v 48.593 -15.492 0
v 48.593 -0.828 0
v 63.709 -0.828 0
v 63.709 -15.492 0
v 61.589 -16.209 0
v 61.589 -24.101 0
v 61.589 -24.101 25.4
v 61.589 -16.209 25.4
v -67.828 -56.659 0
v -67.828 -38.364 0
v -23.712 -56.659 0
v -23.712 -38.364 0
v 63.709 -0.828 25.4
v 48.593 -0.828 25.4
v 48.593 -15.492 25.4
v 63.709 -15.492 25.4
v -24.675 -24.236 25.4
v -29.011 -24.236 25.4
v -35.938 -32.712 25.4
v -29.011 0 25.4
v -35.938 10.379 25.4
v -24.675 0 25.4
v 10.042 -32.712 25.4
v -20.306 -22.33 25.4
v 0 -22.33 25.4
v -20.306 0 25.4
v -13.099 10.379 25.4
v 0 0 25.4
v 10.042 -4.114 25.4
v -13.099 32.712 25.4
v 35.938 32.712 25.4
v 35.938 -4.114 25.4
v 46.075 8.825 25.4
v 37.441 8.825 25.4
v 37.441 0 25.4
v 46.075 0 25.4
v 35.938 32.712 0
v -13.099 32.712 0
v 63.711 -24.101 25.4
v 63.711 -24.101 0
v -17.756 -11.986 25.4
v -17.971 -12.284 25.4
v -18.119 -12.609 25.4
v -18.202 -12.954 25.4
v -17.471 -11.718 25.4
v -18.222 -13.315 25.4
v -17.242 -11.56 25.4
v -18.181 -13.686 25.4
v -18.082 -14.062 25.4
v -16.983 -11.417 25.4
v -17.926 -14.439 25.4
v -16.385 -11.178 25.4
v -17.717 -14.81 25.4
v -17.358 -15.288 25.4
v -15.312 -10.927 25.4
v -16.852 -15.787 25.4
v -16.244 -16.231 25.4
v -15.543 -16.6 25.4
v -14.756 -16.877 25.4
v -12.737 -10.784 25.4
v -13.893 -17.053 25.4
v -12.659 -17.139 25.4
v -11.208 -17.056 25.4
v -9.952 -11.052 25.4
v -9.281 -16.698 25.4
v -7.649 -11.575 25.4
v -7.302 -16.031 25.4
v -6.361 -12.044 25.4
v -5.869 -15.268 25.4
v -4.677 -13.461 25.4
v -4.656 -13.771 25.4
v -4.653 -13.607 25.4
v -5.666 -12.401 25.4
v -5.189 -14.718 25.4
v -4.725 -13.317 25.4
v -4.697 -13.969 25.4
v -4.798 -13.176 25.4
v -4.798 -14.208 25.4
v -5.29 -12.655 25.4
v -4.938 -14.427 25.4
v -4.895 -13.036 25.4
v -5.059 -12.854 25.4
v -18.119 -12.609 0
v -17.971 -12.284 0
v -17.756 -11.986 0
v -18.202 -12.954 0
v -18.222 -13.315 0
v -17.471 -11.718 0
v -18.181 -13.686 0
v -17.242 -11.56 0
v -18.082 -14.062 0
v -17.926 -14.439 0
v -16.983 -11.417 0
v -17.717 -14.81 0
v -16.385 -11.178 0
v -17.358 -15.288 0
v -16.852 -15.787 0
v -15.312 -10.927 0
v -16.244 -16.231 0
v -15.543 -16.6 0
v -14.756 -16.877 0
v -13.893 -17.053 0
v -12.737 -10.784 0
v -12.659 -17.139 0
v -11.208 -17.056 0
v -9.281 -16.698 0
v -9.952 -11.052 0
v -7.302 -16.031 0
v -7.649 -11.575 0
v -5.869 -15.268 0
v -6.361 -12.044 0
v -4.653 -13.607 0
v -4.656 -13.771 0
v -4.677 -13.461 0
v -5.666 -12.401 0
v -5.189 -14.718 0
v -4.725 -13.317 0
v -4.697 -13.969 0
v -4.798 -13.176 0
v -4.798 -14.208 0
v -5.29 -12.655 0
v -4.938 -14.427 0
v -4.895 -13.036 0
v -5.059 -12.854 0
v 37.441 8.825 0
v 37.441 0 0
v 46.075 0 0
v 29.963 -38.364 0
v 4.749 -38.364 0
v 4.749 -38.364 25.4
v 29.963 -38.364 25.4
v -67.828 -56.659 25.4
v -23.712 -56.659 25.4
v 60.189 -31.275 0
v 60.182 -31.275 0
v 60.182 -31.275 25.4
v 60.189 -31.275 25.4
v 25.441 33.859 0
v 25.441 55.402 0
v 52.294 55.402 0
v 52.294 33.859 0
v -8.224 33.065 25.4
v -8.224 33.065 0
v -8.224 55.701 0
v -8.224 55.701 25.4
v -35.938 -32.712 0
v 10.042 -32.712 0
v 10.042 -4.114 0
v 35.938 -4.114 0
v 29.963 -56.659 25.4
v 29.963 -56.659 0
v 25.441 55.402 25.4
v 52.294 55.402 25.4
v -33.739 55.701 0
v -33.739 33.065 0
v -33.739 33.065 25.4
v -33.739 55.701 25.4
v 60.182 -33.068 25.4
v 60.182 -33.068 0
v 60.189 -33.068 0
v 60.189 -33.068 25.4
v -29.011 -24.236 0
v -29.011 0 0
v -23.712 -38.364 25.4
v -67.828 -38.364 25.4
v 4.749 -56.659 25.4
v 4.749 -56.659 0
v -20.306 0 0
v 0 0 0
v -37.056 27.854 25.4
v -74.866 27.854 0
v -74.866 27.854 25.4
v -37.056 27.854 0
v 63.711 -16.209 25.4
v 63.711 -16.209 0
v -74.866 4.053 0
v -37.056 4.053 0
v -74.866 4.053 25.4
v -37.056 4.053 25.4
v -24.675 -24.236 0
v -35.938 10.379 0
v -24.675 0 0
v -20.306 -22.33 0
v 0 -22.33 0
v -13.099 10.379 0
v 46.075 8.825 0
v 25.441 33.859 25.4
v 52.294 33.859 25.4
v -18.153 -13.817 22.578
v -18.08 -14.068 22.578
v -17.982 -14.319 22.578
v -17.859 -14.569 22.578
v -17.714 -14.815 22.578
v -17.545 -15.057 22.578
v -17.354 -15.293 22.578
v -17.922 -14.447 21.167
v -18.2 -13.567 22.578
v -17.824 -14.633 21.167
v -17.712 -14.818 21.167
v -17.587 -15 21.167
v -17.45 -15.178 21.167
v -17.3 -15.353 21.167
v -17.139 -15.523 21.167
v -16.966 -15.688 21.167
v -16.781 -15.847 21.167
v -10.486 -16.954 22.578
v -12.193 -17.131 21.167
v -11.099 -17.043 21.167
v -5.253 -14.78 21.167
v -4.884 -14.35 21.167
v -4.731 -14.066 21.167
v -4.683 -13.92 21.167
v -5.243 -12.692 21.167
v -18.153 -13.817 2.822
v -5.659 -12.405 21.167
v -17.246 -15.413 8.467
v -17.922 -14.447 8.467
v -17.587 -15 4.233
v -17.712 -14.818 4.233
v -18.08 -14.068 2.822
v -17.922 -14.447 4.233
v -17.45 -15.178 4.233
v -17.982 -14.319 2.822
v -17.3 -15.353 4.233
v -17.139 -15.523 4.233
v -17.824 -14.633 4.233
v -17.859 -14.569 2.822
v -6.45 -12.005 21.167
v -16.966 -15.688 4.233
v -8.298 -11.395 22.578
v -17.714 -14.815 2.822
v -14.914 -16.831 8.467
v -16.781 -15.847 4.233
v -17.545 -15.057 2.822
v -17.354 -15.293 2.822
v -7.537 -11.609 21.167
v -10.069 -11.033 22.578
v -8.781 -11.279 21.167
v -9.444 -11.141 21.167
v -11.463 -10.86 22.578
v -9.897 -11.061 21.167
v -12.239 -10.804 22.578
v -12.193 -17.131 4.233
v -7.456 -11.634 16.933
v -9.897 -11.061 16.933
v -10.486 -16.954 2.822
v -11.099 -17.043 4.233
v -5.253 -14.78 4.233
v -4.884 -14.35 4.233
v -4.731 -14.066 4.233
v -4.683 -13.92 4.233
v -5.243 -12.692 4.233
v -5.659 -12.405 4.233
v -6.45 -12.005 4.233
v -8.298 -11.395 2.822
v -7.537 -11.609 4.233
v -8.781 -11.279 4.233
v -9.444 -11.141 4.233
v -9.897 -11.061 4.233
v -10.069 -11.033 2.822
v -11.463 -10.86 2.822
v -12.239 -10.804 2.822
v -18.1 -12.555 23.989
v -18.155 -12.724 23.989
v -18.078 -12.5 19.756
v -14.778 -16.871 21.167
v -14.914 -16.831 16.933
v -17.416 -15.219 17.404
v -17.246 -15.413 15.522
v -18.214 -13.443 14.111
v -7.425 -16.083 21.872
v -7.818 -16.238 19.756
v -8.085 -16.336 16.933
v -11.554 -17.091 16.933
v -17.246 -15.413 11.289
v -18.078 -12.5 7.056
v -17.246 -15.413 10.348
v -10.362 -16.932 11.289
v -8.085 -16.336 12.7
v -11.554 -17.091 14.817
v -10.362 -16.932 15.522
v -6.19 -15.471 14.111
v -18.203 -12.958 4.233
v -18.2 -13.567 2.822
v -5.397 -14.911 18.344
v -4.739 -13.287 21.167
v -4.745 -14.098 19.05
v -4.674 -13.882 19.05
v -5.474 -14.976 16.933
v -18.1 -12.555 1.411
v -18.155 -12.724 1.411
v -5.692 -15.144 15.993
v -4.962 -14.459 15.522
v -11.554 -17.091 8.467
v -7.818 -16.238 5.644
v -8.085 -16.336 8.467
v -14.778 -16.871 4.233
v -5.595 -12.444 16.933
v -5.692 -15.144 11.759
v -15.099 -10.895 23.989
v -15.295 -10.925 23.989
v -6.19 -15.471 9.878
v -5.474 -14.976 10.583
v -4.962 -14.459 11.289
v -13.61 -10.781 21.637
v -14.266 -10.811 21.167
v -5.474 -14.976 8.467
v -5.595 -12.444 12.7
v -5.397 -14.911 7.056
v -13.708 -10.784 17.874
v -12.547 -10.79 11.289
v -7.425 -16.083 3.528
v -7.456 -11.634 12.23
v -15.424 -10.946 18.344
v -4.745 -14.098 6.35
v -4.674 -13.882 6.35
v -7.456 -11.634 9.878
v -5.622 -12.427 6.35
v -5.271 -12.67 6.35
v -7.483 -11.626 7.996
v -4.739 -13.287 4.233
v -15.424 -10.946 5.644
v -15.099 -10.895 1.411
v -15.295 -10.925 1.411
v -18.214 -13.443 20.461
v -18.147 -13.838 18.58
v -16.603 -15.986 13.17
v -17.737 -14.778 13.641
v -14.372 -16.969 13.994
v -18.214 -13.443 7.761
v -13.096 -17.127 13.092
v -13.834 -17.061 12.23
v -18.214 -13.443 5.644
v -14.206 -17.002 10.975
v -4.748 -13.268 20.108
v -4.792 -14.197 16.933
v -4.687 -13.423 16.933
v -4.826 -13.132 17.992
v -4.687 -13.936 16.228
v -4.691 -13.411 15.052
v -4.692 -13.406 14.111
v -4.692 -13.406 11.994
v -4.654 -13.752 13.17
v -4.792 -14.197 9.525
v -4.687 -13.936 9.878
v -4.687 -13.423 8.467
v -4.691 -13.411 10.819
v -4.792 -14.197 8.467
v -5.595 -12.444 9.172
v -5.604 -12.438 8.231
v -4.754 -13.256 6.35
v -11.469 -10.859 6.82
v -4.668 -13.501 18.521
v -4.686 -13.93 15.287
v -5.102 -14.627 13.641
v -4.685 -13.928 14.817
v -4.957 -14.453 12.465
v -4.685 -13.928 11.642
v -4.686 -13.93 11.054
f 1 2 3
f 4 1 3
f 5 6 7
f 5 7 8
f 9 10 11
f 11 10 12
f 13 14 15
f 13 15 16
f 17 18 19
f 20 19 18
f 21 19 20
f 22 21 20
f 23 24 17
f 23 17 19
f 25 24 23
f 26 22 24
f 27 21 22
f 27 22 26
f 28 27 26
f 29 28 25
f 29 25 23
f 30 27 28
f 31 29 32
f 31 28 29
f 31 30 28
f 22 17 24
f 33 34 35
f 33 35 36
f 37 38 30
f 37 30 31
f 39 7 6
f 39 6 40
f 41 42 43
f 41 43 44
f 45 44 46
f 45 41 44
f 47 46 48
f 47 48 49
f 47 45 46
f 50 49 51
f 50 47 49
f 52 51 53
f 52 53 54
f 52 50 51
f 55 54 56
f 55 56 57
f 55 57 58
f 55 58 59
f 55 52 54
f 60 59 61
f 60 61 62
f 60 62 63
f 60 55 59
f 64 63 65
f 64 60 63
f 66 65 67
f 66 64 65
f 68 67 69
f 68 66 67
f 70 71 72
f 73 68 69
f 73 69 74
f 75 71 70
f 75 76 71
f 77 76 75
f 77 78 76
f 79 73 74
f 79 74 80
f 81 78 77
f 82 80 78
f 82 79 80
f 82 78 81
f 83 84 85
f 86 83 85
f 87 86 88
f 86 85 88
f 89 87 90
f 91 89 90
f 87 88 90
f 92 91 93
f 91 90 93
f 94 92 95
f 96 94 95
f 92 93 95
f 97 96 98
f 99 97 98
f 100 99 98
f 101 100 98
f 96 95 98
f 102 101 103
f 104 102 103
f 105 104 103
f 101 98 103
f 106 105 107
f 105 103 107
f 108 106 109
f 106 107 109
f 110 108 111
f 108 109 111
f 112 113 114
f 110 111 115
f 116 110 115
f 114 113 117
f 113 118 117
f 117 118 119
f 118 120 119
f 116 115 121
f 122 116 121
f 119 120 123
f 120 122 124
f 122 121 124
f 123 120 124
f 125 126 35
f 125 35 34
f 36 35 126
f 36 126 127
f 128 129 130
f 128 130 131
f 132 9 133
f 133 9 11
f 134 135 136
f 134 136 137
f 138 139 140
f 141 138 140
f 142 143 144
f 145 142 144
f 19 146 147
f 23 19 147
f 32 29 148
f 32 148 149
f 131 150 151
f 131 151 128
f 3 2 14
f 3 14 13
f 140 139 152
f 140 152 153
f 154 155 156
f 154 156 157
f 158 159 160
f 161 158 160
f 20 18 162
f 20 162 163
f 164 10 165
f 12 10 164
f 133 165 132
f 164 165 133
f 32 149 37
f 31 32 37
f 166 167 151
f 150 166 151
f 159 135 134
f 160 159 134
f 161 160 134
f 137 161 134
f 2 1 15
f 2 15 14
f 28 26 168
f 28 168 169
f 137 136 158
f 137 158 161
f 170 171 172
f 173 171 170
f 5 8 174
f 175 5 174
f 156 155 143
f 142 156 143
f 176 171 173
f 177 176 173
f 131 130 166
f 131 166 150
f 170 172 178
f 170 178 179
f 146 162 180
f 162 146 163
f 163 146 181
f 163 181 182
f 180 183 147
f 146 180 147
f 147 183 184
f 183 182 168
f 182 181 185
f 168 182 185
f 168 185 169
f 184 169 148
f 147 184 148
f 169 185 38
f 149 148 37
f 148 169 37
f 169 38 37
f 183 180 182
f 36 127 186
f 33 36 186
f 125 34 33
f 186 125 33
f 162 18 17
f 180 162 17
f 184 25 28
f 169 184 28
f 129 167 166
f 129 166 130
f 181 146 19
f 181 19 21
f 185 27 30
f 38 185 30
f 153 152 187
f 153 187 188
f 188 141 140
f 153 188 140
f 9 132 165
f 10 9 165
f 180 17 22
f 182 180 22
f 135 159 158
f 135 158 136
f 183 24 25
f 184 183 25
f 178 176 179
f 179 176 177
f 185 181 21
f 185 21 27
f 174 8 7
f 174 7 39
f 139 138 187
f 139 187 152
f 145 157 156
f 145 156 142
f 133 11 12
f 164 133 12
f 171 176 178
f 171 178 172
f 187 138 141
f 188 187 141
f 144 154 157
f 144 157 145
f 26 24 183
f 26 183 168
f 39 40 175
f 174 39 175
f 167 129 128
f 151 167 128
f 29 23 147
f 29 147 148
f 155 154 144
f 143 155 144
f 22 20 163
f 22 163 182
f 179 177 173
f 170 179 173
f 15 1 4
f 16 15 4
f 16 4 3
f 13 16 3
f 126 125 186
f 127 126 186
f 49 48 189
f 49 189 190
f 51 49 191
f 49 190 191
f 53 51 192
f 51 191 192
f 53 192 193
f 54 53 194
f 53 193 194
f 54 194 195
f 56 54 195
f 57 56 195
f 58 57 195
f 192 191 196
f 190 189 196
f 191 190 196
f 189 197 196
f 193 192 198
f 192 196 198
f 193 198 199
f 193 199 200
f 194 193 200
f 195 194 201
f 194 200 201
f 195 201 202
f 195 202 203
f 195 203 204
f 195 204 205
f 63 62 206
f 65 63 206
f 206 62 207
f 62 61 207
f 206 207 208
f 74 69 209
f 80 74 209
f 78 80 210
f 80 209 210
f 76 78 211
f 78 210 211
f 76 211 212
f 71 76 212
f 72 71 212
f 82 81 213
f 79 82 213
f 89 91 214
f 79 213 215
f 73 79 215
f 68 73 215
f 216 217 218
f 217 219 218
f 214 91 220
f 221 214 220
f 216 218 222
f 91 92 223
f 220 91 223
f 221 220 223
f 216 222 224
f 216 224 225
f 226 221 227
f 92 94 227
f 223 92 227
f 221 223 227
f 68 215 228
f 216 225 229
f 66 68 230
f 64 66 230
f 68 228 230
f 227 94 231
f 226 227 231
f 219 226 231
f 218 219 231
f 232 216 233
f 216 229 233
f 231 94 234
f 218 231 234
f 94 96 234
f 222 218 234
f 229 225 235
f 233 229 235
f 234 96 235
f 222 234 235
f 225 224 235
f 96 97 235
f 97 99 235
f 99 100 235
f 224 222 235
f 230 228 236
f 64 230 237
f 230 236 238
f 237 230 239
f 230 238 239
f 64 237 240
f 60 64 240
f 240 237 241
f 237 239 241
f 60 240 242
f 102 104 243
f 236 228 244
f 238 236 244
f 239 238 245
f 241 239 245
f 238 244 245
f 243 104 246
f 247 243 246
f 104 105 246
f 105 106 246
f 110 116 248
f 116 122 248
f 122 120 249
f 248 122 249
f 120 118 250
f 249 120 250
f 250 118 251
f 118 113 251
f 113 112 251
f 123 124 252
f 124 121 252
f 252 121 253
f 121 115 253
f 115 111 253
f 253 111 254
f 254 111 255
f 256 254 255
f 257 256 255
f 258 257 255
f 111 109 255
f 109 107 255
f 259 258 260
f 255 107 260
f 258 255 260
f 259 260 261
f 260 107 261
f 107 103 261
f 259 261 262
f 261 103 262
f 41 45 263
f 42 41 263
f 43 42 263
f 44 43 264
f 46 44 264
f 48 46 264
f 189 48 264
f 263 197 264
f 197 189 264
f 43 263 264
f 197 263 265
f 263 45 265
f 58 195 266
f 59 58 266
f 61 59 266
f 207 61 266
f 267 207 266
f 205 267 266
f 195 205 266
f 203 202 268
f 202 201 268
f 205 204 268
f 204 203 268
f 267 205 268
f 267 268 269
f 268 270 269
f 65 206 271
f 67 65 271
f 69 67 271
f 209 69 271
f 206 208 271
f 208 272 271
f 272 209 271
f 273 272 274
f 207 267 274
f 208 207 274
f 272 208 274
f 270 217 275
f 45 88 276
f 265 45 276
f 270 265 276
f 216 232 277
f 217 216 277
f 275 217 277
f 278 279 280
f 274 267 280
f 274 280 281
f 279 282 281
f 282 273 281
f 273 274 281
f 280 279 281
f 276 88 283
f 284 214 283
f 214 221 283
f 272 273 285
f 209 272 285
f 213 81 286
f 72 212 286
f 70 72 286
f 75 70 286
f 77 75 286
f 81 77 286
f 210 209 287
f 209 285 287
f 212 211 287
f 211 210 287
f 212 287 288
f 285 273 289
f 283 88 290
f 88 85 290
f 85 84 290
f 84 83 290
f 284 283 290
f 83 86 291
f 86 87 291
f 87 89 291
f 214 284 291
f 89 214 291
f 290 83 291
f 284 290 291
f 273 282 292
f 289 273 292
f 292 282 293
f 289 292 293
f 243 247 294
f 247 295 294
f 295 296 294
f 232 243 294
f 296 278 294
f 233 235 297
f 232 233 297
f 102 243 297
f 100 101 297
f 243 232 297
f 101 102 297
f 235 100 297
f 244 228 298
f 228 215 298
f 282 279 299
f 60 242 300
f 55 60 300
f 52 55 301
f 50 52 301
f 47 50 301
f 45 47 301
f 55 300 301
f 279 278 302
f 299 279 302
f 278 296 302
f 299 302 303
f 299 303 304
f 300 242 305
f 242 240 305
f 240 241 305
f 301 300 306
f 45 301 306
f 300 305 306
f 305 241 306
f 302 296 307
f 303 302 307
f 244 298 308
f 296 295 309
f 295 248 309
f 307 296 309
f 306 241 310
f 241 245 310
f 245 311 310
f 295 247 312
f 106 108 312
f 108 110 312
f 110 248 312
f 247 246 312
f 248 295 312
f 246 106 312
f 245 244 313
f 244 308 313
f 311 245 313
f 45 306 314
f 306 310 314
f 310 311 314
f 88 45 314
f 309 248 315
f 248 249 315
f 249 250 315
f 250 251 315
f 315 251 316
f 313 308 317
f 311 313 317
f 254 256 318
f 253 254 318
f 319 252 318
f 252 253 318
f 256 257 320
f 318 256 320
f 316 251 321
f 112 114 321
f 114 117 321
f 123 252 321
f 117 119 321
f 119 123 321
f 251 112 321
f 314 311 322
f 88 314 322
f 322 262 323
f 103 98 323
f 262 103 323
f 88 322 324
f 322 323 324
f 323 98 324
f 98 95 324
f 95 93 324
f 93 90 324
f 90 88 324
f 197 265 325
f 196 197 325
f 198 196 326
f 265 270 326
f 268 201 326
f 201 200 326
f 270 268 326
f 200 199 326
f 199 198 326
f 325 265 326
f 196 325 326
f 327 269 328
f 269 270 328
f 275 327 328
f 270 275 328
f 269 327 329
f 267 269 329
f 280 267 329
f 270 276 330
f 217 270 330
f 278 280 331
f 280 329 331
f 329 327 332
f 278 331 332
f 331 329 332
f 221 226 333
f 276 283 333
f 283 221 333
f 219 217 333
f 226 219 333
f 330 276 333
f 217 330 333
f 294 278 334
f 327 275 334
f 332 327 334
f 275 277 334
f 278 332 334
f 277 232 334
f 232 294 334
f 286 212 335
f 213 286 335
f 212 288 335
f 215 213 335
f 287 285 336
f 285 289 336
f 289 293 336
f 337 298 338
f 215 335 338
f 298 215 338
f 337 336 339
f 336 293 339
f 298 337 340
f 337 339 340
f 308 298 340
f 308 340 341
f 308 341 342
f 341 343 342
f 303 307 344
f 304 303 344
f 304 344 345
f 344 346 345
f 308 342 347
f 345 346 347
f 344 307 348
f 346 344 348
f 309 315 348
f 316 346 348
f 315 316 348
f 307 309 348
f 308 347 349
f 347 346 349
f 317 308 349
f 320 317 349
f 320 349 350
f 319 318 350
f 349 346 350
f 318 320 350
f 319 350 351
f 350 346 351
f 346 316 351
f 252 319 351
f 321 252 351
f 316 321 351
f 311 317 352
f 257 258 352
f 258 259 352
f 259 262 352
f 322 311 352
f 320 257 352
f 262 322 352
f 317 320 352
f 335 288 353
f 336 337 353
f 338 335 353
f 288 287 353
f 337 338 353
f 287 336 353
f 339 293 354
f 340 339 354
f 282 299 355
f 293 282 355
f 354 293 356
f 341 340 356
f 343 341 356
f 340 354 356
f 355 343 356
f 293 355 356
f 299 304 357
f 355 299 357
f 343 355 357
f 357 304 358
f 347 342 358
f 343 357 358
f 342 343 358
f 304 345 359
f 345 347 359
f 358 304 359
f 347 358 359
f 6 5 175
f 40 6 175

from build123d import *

# Parameters (mm, degrees)
F0_W      = 71.8751400709
F0_H      = 65.4248073697
F1_DEPTH  = 25.4
F2_W      = 22.8386623785
F2_H      = 22.3337542266
F3_DEPTH  = 25.401
F4_W      = 25.8953208104
F4_H      = 28.5988273099
F5_DEPTH  = 25.401
F6_W      = 20.3064456582
F6_H      = 22.3295912147
F7_DEPTH  = 25.401
F8_W      = 4.3360479176
F8_H      = 24.2358855903
F9_DEPTH  = 25.401
F10_W     = 97.7910701185
F10_H     = 18.2947292924
F11_DEPTH = 25.4
F12_W     = 28.4608709626
F12_H     = 29.4496640563
F13_DEPTH = 25.401
F14_W     = 25.5147358403
F14_H     = 22.6351767778
F15_DEPTH = 25.4
F16_W     = 26.8525015563
F16_H     = 21.5431787074
F17_DEPTH = 25.4
F18_W     = 8.6342580616
F18_H     = 8.8252546266
F19_DEPTH = 25.4
F18_W_2   = 15.1156596839
F18_H_2   = 14.6633193363
F18_W_3   = 2.1220184863
F18_H_3   = 7.8927390277
F18_W_4   = 0.0067055225
F18_H_4   = 1.7926245928
F20_W     = 37.8104783595
F20_H     = 23.8008620217
F21_DEPTH = 25.4
F23_DEPTH = 25.4


with BuildPart() as f1:
    # F0 (on Top) → F1 (new body)
    with BuildSketch(Plane.XY):
        Rectangle(F0_W, F0_H)
    extrude(amount=F1_DEPTH)

    # F2 (on face) → F3 (cut, through all)
    with BuildSketch(Plane.XY.offset(25.4)):
        with Locations((-24.5182388462, 21.5455265716)):
            Rectangle(F2_W, F2_H)
    extrude(amount=-F3_DEPTH, mode=Mode.SUBTRACT)

    # F4 (on face) → F5 (cut, through all)
    with BuildSketch(Plane.XY.offset(25.4)):
        with Locations((22.9899096303, -18.4129900299)):
            Rectangle(F4_W, F4_H)
    extrude(amount=-F5_DEPTH, mode=Mode.SUBTRACT)

    # F6 (on face) → F7 (cut, through all)
    with BuildSketch(Plane.XY.offset(25.4)):
        with Locations((-10.1532228291, -11.1647956073)):
            Rectangle(F6_W, F6_H)
    extrude(amount=-F7_DEPTH, mode=Mode.SUBTRACT)

    # F8 (on face) → F9 (cut, through all)
    with BuildSketch(Plane.XY.offset(25.4)):
        with Locations((-26.8425736576, -12.1179427952)):
            Rectangle(F8_W, F8_H)
    extrude(amount=-F9_DEPTH, mode=Mode.SUBTRACT)


with BuildPart() as f11:
    # F10 (on Top) → F11 (new body)
    with BuildSketch(Plane.XY):
        with Locations((-18.9329413697, -47.5115664303)):
            Rectangle(F10_W, F10_H)
    extrude(amount=F11_DEPTH)

    # F12 (on face) → F13 (cut, through all)
    with BuildSketch(Plane.XY.offset(25.4)):
        with Locations((-9.4812272582, -53.0890338123)):
            Rectangle(F12_W, F12_H)
    extrude(amount=-F13_DEPTH, mode=Mode.SUBTRACT)


with BuildPart() as f15:
    # F14 (on Top) → F15 (new body)
    with BuildSketch(Plane.XY):
        with Locations((-20.98152088, 44.3829745054)):
            Rectangle(F14_W, F14_H)
    extrude(amount=F15_DEPTH)


with BuildPart() as f17:
    # F16 (on Top) → F17 (new body)
    with BuildSketch(Plane.XY):
        with Locations((38.8674447313, 44.6308199316)):
            Rectangle(F16_W, F16_H)
    extrude(amount=F17_DEPTH)


with BuildPart() as f19:
    # F18 (on Top) → F19 (new body)
    with BuildSketch(Plane.XY):
        with Locations((41.7577605695, 4.4126273133)):
            Rectangle(F18_W, F18_H)
    extrude(amount=F19_DEPTH)


with BuildPart() as f19b:
    # F18 (on Top) → F19, piece 2 (new body)
    with BuildSketch(Plane.XY):
        with Locations((56.1508778483, -8.1598557299)):
            Rectangle(F18_W_2, F18_H_2)
    extrude(amount=F19_DEPTH)


with BuildPart() as f19c:
    # F18 (on Top) → F19, piece 3 (new body)
    with BuildSketch(Plane.XY):
        with Locations((62.6503732055, -20.1549362391)):
            Rectangle(F18_W_3, F18_H_3)
    extrude(amount=F19_DEPTH)


with BuildPart() as f19d:
    # F18 (on Top) → F19, piece 4 (new body)
    with BuildSketch(Plane.XY):
        with Locations((60.1851865649, -32.1715809405)):
            Rectangle(F18_W_4, F18_H_4)
    extrude(amount=F19_DEPTH)


with BuildPart() as f21:
    # F20 (on Top) → F21 (new body)
    with BuildSketch(Plane.XY):
        with Locations((-55.9609811753, 15.953773167)):
            Rectangle(F20_W, F20_H)
    extrude(amount=F21_DEPTH)


with BuildPart() as f23:
    # F22 (on Top) → F23 (new body)
    with BuildSketch(Plane.XY):
        with BuildLine():
            add(Edge.make_bspline(
                [(-17.4706317484, -11.7181073874), (-19.1868801709, -13.0558307579), (-15.9209529822, -19.9308273896), (3.3955781074, -12.5960314776), (-14.8929109318, -9.708912603), (-17.4706317484, -11.7181073874)],
                knots=[0, 0, 0, 0, 0.2580559353, 0.6124126626, 1, 1, 1, 1], degree=3))
        make_face()
    extrude(amount=F23_DEPTH)


solid = Compound([f1.part, f11.part, f15.part, f17.part, f19.part, f19b.part, f19c.part, f19d.part, f21.part, f23.part])
